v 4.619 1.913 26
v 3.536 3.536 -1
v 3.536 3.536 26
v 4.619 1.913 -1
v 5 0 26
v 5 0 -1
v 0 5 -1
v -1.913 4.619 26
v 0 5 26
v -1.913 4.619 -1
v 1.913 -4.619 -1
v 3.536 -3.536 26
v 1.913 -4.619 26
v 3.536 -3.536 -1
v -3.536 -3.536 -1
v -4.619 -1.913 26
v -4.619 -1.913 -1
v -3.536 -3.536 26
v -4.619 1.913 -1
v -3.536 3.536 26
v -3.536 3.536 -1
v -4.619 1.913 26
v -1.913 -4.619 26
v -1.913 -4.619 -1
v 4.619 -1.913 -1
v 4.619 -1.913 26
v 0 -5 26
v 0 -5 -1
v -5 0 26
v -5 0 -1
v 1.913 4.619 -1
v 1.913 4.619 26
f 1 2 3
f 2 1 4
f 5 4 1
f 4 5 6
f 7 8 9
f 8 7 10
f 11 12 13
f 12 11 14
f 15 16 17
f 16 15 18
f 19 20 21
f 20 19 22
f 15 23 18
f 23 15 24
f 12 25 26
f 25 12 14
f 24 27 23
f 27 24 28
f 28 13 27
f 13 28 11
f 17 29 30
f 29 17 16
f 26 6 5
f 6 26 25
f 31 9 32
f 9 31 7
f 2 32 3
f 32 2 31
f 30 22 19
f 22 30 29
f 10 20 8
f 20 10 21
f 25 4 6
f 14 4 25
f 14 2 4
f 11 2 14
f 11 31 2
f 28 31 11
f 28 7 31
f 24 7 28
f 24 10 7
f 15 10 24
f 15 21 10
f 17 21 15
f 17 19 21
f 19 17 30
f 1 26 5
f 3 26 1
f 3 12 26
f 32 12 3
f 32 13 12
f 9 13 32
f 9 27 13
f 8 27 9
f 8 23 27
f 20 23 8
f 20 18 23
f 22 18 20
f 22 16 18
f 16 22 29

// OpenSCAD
stem_base_r = 5;       // outer radius of stem
stem_base_h = 20;       // height of stem base
stem_top_r = 5;        // outer radius of screw insert
stem_top_h = 5;        // height of screw insert

insert_r = 3;
insert_h = 4;
screw_well_depth = 2;  // thickness of base of screw well

screw_shaft_r = 1.5;
screw_head_r = 3;

stem_base();
stem_top();
stem_negative();

module stem_negative() {
    translate([0,0,-1]) {
        linear_extrude(stem_base_h + stem_top_h + 2) {
            circle(stem_base_r);
        }
    }
}

module stem_base(r=stem_base_r, h=stem_base_h) {
    difference() {
        linear_extrude(h) {
            circle(r);
        }
        translate([0,0,h - insert_h]) {
            linear_extrude(insert_h + 1) {
                circle(insert_r);
            }
        }
    }
}

module stem_top() {
    translate([0,0,stem_base_h]) {
        difference() {
            linear_extrude(stem_top_h) {
                circle(stem_top_r);
            }
            translate([0,0,screw_well_depth]) {
                linear_extrude(stem_top_h) {
                    circle(screw_head_r);
                }
            }
            translate([0,0,-1]) {
                linear_extrude(screw_well_depth + 2) {
                    circle(screw_shaft_r);
                }
            }
        }
    }
}
